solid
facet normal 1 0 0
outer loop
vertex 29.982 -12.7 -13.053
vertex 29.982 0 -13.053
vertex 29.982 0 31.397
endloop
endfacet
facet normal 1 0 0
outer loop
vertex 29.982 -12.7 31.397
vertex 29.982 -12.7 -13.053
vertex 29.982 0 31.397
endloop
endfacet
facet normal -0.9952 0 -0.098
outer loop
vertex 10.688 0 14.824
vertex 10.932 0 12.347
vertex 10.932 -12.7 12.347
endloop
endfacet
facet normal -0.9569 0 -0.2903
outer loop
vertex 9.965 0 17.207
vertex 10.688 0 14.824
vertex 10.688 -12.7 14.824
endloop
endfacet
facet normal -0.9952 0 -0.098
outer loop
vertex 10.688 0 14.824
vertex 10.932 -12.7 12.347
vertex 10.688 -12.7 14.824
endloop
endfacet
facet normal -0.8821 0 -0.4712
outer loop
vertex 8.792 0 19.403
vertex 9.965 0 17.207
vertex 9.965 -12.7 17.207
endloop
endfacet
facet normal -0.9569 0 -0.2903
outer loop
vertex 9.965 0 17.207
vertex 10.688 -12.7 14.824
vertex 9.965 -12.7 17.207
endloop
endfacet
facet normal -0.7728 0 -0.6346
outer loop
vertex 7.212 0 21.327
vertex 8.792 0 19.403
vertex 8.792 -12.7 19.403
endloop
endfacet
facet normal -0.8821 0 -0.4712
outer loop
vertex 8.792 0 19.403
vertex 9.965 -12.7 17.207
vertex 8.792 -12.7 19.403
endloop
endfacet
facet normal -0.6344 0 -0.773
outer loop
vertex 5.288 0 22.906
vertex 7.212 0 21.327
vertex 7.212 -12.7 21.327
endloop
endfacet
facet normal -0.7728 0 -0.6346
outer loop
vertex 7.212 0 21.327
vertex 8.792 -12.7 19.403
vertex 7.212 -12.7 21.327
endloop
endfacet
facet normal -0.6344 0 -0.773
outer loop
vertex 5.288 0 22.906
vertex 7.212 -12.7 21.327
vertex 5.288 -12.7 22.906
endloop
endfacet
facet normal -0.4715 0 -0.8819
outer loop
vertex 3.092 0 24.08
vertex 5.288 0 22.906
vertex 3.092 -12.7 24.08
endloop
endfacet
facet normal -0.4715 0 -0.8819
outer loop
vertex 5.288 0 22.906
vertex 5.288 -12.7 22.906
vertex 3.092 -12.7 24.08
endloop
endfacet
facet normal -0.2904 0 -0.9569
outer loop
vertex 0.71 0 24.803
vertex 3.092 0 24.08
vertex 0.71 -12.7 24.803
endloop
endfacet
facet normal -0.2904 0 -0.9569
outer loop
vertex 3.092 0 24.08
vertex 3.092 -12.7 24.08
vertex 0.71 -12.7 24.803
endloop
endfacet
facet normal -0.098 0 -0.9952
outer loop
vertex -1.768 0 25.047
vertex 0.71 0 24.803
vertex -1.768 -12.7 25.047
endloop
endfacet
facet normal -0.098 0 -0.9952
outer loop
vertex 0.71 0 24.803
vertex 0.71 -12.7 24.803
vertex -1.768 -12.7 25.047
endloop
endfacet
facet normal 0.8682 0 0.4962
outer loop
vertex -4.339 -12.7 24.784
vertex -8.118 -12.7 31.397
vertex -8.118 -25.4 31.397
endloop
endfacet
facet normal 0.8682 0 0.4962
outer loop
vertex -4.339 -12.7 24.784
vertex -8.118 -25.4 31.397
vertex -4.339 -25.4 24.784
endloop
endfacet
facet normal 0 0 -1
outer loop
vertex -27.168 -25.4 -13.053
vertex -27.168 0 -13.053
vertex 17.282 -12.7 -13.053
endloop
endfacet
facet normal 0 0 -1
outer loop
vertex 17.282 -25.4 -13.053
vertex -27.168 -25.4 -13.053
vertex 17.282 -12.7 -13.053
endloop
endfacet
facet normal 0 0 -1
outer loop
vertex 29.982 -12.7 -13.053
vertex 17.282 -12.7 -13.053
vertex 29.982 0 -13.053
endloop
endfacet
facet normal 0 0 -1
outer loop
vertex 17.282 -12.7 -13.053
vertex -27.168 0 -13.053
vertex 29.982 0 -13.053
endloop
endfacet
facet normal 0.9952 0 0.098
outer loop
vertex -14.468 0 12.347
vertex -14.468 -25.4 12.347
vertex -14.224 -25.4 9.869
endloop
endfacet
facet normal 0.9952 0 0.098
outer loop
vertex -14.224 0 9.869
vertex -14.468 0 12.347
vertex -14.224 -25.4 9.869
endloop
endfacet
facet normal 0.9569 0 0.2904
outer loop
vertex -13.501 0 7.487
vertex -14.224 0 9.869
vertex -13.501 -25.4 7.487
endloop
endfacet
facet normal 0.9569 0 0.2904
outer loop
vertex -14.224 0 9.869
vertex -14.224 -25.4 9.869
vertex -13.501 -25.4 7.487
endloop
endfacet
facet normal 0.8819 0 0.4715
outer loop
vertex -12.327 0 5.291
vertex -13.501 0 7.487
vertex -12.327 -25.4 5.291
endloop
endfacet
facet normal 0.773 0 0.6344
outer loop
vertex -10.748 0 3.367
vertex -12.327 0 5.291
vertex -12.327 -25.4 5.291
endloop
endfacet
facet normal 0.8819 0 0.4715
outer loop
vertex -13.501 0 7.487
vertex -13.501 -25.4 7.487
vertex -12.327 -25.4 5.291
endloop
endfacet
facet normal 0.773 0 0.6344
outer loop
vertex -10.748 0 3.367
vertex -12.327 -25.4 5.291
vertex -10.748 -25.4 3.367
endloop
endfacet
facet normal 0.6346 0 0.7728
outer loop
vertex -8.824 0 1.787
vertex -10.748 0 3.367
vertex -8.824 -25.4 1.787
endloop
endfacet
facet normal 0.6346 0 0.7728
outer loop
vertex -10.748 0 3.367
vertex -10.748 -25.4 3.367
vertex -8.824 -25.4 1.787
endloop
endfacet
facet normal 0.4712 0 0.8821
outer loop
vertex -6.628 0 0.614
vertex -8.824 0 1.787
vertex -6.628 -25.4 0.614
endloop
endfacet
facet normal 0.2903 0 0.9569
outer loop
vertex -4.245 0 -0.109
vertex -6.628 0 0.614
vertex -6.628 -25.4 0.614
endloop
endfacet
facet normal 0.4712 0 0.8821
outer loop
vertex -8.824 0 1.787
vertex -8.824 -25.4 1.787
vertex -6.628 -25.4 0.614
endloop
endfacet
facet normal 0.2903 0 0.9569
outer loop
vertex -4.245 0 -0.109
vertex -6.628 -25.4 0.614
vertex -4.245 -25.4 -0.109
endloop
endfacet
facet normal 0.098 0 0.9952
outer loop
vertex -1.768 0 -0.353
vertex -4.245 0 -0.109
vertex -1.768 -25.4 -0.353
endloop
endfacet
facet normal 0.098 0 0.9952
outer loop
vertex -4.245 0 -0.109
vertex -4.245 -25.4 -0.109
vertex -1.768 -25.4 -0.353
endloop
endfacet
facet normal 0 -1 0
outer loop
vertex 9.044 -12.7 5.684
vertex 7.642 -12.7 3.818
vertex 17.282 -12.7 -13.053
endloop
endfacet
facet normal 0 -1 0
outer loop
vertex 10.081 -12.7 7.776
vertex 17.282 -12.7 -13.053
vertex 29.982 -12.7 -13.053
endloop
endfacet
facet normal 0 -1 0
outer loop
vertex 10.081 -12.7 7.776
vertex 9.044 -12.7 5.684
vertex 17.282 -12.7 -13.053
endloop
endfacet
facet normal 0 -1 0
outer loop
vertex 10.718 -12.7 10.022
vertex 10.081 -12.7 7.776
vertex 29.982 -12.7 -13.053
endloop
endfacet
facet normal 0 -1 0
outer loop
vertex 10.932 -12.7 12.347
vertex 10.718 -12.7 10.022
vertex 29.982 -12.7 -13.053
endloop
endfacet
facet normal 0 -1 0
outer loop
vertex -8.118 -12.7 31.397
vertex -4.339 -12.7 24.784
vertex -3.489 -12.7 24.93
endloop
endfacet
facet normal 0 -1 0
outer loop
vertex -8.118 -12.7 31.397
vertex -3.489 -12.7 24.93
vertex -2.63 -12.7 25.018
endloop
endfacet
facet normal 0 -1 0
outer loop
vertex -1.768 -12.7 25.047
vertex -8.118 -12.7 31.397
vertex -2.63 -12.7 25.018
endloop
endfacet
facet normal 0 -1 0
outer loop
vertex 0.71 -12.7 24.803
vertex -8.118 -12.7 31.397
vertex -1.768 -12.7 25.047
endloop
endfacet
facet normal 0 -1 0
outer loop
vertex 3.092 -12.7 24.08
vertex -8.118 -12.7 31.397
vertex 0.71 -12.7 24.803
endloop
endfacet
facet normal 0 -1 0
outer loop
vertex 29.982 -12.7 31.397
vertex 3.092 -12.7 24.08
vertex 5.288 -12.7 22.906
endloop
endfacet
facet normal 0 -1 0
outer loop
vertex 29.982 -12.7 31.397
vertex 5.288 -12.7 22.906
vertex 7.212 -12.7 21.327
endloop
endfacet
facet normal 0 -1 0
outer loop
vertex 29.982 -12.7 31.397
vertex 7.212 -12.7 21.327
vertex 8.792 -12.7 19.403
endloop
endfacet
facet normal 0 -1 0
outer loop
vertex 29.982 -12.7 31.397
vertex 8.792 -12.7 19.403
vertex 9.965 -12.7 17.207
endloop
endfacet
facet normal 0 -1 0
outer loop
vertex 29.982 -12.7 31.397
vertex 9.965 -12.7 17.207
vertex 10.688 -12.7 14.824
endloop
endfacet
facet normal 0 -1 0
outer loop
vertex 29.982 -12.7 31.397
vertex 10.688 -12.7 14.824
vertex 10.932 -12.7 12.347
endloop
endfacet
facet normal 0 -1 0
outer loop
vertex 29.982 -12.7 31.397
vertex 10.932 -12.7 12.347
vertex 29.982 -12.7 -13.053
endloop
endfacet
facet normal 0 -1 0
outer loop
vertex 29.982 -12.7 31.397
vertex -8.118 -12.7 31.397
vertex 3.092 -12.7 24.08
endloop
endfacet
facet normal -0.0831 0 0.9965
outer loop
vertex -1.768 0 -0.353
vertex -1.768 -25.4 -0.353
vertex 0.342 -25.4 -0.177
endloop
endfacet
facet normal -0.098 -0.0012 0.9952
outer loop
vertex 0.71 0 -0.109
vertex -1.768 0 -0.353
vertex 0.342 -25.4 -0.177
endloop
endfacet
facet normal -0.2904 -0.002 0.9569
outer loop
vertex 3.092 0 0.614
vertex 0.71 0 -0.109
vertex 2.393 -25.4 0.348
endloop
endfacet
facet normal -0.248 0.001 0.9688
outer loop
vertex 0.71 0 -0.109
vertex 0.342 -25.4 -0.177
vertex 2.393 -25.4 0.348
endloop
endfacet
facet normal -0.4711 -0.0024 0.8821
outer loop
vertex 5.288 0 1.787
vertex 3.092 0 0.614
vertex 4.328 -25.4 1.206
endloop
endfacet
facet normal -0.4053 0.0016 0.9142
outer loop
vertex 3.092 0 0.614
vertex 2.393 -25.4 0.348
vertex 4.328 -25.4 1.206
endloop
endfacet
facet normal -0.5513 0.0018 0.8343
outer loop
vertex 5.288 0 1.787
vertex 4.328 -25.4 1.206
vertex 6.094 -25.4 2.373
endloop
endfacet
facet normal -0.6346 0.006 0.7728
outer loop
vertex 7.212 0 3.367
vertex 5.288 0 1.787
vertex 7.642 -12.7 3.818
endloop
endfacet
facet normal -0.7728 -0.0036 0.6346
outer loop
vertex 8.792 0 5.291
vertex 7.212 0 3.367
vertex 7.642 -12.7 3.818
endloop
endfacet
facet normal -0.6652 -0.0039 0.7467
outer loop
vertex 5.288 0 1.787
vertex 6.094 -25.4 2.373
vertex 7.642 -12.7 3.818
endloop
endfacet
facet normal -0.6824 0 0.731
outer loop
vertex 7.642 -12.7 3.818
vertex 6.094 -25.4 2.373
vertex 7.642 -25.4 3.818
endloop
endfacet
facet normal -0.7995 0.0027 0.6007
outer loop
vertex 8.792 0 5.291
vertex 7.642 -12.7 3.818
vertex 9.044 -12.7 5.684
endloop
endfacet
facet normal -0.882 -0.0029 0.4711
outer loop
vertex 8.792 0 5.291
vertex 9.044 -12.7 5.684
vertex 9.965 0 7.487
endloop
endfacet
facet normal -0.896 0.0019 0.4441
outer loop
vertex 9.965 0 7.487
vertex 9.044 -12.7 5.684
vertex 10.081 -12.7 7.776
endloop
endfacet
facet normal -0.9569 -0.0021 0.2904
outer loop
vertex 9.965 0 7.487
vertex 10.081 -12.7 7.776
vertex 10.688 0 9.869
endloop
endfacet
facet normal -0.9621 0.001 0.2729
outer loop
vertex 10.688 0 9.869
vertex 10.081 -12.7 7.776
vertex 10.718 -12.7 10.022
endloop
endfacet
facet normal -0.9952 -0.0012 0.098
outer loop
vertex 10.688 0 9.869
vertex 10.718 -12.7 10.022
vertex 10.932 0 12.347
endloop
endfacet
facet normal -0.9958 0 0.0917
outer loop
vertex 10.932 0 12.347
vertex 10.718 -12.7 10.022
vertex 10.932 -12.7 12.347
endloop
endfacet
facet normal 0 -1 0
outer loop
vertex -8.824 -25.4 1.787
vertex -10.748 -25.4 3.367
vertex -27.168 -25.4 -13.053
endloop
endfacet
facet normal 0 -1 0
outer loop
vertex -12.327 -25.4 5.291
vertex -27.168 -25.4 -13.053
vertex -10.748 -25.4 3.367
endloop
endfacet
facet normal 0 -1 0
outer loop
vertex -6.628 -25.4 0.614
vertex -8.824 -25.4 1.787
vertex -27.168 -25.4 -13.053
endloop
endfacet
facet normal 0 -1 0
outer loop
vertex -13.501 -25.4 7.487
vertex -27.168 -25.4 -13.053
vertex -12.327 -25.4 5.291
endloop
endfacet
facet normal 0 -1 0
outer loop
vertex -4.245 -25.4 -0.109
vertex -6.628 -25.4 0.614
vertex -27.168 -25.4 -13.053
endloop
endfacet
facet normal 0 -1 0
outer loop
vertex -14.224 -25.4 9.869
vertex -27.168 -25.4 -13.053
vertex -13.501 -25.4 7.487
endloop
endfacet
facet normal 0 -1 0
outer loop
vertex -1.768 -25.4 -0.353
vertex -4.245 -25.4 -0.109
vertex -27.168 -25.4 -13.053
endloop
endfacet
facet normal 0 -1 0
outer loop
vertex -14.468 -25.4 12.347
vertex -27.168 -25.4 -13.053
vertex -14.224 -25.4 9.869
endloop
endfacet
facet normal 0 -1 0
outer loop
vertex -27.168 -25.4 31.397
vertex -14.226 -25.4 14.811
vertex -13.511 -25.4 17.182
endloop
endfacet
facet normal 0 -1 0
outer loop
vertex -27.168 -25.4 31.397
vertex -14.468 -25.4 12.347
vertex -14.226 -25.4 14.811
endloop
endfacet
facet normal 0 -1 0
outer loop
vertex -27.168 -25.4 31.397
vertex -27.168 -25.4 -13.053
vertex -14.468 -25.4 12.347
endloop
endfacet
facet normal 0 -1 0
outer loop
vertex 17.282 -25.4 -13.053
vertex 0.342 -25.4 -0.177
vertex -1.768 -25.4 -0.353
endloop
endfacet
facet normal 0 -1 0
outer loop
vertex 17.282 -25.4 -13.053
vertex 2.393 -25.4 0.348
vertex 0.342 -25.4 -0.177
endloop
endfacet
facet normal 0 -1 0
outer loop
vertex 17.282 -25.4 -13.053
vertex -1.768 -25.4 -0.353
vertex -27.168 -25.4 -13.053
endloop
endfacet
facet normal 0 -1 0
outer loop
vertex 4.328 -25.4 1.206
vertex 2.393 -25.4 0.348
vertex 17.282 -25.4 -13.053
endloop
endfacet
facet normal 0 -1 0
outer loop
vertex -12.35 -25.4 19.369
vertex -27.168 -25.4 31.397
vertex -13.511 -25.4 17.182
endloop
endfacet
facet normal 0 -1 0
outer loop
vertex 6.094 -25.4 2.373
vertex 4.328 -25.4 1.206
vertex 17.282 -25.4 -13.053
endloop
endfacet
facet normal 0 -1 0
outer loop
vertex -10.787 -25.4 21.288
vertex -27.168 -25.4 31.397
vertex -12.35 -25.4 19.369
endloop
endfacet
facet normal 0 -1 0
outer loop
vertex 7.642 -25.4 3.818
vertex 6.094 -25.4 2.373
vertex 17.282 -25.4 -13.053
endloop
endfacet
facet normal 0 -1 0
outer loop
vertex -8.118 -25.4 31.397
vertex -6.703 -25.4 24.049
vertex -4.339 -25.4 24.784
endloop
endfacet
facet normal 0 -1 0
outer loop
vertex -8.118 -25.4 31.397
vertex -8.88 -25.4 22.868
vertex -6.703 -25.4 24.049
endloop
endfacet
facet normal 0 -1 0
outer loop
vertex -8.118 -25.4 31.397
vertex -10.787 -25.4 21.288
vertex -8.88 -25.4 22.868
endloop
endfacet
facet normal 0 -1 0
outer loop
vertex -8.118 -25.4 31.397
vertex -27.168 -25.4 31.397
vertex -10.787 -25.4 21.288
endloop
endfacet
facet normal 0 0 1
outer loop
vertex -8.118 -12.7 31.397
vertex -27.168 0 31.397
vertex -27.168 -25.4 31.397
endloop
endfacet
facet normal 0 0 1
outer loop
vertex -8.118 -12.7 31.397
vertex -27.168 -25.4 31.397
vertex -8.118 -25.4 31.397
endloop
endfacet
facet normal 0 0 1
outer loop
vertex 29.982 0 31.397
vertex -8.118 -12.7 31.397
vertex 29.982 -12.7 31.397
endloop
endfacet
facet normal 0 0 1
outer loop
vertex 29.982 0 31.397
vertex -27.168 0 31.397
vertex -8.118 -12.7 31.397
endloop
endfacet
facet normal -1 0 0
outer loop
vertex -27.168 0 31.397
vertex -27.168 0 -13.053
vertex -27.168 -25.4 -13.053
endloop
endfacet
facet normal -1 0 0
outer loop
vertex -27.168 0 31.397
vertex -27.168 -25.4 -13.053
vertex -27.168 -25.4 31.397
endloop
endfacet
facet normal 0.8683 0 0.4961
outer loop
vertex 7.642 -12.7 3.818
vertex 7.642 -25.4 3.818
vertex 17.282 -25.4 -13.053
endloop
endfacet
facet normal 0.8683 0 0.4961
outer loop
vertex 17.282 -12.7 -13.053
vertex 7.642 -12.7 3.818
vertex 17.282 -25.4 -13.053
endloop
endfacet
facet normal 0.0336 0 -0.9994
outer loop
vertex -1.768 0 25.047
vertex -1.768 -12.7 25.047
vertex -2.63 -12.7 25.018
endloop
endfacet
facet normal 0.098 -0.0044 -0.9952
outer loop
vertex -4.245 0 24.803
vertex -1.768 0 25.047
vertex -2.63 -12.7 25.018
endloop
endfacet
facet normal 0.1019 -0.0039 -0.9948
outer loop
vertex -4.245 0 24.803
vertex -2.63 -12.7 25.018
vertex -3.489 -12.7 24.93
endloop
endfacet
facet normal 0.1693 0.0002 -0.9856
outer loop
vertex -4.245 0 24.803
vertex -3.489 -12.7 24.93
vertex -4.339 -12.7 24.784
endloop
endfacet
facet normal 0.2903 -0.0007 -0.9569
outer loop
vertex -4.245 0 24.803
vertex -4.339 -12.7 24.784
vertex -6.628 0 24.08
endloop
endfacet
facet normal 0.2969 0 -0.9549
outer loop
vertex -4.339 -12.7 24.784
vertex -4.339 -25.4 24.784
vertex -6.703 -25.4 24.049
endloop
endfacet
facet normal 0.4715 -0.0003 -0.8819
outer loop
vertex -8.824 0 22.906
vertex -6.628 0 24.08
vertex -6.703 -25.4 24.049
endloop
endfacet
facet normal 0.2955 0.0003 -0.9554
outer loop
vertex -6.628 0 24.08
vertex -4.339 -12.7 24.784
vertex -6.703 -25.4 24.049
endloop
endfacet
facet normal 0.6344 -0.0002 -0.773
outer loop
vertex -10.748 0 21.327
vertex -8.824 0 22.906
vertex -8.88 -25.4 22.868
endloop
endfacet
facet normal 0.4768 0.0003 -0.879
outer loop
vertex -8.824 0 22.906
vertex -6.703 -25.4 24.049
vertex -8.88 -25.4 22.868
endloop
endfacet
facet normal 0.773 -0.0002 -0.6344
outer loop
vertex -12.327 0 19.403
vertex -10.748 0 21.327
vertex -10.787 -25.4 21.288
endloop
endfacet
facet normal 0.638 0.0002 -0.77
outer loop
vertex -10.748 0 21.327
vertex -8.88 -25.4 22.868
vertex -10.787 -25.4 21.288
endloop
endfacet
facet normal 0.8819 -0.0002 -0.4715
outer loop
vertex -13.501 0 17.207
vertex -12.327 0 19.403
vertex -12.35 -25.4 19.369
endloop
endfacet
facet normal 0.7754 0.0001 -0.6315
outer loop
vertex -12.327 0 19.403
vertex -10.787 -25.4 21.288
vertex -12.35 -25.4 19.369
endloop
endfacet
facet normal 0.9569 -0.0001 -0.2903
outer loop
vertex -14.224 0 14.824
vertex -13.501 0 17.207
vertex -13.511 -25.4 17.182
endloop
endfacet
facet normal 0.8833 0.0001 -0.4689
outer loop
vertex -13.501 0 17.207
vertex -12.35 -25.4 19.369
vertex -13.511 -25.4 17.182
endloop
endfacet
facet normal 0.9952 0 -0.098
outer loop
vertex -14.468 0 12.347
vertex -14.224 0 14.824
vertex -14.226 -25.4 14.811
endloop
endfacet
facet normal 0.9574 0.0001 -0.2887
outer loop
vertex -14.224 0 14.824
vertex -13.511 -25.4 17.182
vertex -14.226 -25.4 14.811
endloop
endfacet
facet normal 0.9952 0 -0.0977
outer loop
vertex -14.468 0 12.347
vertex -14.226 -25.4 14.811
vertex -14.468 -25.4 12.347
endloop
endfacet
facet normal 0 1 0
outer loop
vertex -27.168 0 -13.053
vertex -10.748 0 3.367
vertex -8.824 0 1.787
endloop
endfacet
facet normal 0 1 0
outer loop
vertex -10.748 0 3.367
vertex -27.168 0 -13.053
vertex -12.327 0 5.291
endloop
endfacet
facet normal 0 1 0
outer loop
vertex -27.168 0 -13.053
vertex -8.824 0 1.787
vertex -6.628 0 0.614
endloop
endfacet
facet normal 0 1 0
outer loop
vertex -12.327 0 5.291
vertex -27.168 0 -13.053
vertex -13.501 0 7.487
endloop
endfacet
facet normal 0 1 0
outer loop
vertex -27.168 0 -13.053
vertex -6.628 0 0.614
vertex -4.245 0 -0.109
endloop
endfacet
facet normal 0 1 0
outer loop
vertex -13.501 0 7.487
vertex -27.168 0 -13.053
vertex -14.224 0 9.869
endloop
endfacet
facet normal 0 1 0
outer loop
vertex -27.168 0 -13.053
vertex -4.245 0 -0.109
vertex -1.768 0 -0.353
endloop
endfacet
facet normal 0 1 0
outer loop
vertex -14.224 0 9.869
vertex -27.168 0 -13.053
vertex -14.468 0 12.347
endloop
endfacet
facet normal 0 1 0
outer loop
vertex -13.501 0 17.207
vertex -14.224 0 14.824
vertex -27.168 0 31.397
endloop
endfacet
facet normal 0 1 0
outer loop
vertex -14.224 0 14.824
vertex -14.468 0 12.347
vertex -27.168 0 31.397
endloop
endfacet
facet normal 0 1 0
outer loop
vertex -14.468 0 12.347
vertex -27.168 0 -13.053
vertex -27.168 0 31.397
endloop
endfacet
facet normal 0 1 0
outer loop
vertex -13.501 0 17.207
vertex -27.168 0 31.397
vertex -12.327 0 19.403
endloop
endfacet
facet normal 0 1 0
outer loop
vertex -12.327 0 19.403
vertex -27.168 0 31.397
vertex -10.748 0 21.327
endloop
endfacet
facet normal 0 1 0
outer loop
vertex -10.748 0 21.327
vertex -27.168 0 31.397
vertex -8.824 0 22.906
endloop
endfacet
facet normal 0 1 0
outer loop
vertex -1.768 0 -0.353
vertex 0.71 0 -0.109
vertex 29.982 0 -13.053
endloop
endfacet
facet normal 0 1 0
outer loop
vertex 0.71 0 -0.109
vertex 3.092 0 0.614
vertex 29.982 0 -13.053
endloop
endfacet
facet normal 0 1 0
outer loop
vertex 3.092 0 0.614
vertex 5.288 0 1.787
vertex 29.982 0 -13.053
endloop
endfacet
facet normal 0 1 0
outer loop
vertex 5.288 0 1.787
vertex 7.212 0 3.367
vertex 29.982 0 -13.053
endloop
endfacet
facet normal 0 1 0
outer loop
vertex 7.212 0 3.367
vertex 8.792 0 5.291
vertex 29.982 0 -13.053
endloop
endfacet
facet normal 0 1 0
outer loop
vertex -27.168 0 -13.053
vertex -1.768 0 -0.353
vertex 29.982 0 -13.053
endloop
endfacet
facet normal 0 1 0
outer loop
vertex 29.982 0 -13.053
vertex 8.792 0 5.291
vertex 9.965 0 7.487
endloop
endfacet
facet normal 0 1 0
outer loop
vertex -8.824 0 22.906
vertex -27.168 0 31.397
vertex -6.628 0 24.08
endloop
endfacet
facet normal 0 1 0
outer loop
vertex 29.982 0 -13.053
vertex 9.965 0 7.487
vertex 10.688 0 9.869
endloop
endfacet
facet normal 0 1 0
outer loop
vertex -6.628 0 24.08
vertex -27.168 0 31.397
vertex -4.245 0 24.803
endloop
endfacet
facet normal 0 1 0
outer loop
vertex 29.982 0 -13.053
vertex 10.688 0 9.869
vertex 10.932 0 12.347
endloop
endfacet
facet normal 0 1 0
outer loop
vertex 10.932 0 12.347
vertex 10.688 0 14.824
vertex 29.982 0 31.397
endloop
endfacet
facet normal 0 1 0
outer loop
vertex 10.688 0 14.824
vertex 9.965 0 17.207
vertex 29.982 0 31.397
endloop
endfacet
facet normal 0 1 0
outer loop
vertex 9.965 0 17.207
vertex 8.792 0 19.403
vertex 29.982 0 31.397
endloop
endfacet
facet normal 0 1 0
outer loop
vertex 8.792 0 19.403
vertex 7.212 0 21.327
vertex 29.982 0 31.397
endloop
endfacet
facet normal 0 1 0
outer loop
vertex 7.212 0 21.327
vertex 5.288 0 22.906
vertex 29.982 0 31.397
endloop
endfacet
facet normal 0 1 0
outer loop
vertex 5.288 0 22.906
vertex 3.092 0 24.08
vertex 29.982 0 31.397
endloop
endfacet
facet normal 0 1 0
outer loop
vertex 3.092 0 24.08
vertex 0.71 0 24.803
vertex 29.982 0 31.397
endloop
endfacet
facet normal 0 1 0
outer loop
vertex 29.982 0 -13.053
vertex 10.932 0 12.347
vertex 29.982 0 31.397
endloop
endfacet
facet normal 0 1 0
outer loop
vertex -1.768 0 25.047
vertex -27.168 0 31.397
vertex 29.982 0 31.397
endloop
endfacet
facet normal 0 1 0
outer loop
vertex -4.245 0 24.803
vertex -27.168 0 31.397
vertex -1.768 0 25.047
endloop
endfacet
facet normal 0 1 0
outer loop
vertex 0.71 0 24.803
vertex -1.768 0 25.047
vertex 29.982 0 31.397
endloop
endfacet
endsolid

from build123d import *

# Parameters (mm, degrees)
F0_W     = 57.15
F0_H     = 44.45
F1_DEPTH = 25.4
F3_DEPTH = 25.401
F5_DEPTH = 12.7


with BuildPart() as f1:
    # F0 (on Front) → F1 (new body)
    with BuildSketch(Plane.XZ):
        with Locations((1.4072097838, 9.1718252664)):
            Rectangle(F0_W, F0_H)
    extrude(amount=F1_DEPTH)

    # F2 (on face) → F3 (cut, through all)
    with BuildSketch(Plane.XZ.offset(25.4)):
        with BuildLine():
            ThreePointArc((-1.7677901676, 25.0468252664), (-10.7480463069, 21.3270814178), (-14.4677902162, 12.3468253036))
            ThreePointArc((-14.4677902162, 12.3468253036), (-10.7480463548, 3.3665691629), (-1.7677902287, -0.3531747336))
            ThreePointArc((-1.7677902287, -0.3531747336), (7.2124659004, 3.3665691409), (10.9322097838, 12.3468252664))
            ThreePointArc((10.9322097838, 12.3468252664), (7.2124659221, 21.3270813703), (-1.7677901676, 25.0468252664))
        make_face()
    extrude(amount=-F3_DEPTH, mode=Mode.SUBTRACT)

    # F4 (on face) → F5 (cut)
    with BuildSketch(Plane.XZ.offset(25.4)):
        with BuildLine():
            Line((29.9822097838, 31.3968252664), (-8.1177902162, 31.3968252664))
            Line((-8.1177902162, 31.3968252664), (-4.3389383209, 24.7838344496))
            ThreePointArc((-4.3389383209, 24.7838344496), (6.25207322, 22.1942508419), (10.9322097838, 12.3468252664))
            ThreePointArc((10.9322097838, 12.3468252664), (10.0810924836, 7.7758320739), (7.641819427, 3.8175083909))
            Line((7.641819427, 3.8175083909), (17.2822097838, -13.0531747336))
            Line((17.2822097838, -13.0531747336), (29.9822097838, -13.0531747336))
            Line((29.9822097838, -13.0531747336), (29.9822097838, 31.3968252664))
        make_face()
    extrude(amount=-F5_DEPTH, mode=Mode.SUBTRACT)


solid = f1.part
